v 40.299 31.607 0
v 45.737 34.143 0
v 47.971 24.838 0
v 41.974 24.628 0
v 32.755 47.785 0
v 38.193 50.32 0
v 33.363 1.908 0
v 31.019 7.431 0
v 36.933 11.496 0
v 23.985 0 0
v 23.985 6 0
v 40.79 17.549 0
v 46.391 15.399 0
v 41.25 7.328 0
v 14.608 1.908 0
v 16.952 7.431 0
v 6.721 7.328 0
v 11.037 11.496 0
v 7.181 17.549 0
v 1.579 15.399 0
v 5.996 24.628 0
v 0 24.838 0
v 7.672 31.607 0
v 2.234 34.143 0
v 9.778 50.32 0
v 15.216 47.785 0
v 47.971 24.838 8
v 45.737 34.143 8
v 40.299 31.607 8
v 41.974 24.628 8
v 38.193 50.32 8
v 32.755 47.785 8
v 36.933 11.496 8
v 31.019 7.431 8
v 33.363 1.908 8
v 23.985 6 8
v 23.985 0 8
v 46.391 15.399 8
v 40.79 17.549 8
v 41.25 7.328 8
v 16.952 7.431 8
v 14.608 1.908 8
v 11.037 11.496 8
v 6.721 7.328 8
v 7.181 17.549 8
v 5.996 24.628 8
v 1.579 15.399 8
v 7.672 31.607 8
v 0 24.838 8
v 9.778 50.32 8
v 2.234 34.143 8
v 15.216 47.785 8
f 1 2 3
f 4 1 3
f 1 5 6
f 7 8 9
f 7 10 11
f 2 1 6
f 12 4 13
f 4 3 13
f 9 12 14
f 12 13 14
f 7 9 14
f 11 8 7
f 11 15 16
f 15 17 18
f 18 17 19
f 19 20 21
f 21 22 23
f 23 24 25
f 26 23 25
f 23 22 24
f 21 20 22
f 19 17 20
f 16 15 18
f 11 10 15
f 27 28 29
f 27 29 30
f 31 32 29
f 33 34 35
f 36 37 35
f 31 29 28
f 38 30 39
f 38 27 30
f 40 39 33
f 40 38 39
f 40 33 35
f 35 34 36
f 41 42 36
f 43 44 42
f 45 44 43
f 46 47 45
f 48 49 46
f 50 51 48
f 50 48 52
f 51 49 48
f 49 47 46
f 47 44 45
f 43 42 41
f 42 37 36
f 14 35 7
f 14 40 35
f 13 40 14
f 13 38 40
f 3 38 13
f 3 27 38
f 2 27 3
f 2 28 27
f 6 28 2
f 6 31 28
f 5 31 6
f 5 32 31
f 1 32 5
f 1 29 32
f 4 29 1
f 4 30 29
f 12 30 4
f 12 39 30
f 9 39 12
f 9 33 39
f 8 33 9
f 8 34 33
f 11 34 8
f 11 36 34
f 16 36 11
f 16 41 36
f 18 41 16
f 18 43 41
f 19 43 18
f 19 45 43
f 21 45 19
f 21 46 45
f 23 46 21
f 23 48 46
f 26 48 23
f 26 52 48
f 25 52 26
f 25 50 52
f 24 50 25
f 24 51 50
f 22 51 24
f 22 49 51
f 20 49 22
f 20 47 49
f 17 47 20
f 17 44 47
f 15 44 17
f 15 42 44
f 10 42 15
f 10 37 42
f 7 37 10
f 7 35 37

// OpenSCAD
$fn = 32;

// ----------------------------------------------------------------------
// Clip blank: omega clip, 8 mm thick
// ----------------------------------------------------------------------

// --- parameters (mm) ---
profile_height = 8;       // extrusion height
profile_points = 26;      // points of the closed outline

profile = [[2.234, 34.143], [0, 24.838], [1.579, 15.399], [6.721, 7.328], [14.608, 1.908], [23.985, 0], [33.363, 1.908], [41.25, 7.328], [46.391, 15.399], [47.971, 24.838], [45.737, 34.143], [38.193, 50.32], [32.755, 47.785], [40.299, 31.607], [41.974, 24.628], [40.79, 17.549], [36.933, 11.496], [31.019, 7.431], [23.985, 6], [16.952, 7.431], [11.037, 11.496], [7.181, 17.549], [5.996, 24.628], [7.672, 31.607], [15.216, 47.785], [9.778, 50.32]];  // single closed polygon, 26 points, counter clockwise

// --- the one profile operation ---
linear_extrude(height = profile_height) polygon(points = profile);
